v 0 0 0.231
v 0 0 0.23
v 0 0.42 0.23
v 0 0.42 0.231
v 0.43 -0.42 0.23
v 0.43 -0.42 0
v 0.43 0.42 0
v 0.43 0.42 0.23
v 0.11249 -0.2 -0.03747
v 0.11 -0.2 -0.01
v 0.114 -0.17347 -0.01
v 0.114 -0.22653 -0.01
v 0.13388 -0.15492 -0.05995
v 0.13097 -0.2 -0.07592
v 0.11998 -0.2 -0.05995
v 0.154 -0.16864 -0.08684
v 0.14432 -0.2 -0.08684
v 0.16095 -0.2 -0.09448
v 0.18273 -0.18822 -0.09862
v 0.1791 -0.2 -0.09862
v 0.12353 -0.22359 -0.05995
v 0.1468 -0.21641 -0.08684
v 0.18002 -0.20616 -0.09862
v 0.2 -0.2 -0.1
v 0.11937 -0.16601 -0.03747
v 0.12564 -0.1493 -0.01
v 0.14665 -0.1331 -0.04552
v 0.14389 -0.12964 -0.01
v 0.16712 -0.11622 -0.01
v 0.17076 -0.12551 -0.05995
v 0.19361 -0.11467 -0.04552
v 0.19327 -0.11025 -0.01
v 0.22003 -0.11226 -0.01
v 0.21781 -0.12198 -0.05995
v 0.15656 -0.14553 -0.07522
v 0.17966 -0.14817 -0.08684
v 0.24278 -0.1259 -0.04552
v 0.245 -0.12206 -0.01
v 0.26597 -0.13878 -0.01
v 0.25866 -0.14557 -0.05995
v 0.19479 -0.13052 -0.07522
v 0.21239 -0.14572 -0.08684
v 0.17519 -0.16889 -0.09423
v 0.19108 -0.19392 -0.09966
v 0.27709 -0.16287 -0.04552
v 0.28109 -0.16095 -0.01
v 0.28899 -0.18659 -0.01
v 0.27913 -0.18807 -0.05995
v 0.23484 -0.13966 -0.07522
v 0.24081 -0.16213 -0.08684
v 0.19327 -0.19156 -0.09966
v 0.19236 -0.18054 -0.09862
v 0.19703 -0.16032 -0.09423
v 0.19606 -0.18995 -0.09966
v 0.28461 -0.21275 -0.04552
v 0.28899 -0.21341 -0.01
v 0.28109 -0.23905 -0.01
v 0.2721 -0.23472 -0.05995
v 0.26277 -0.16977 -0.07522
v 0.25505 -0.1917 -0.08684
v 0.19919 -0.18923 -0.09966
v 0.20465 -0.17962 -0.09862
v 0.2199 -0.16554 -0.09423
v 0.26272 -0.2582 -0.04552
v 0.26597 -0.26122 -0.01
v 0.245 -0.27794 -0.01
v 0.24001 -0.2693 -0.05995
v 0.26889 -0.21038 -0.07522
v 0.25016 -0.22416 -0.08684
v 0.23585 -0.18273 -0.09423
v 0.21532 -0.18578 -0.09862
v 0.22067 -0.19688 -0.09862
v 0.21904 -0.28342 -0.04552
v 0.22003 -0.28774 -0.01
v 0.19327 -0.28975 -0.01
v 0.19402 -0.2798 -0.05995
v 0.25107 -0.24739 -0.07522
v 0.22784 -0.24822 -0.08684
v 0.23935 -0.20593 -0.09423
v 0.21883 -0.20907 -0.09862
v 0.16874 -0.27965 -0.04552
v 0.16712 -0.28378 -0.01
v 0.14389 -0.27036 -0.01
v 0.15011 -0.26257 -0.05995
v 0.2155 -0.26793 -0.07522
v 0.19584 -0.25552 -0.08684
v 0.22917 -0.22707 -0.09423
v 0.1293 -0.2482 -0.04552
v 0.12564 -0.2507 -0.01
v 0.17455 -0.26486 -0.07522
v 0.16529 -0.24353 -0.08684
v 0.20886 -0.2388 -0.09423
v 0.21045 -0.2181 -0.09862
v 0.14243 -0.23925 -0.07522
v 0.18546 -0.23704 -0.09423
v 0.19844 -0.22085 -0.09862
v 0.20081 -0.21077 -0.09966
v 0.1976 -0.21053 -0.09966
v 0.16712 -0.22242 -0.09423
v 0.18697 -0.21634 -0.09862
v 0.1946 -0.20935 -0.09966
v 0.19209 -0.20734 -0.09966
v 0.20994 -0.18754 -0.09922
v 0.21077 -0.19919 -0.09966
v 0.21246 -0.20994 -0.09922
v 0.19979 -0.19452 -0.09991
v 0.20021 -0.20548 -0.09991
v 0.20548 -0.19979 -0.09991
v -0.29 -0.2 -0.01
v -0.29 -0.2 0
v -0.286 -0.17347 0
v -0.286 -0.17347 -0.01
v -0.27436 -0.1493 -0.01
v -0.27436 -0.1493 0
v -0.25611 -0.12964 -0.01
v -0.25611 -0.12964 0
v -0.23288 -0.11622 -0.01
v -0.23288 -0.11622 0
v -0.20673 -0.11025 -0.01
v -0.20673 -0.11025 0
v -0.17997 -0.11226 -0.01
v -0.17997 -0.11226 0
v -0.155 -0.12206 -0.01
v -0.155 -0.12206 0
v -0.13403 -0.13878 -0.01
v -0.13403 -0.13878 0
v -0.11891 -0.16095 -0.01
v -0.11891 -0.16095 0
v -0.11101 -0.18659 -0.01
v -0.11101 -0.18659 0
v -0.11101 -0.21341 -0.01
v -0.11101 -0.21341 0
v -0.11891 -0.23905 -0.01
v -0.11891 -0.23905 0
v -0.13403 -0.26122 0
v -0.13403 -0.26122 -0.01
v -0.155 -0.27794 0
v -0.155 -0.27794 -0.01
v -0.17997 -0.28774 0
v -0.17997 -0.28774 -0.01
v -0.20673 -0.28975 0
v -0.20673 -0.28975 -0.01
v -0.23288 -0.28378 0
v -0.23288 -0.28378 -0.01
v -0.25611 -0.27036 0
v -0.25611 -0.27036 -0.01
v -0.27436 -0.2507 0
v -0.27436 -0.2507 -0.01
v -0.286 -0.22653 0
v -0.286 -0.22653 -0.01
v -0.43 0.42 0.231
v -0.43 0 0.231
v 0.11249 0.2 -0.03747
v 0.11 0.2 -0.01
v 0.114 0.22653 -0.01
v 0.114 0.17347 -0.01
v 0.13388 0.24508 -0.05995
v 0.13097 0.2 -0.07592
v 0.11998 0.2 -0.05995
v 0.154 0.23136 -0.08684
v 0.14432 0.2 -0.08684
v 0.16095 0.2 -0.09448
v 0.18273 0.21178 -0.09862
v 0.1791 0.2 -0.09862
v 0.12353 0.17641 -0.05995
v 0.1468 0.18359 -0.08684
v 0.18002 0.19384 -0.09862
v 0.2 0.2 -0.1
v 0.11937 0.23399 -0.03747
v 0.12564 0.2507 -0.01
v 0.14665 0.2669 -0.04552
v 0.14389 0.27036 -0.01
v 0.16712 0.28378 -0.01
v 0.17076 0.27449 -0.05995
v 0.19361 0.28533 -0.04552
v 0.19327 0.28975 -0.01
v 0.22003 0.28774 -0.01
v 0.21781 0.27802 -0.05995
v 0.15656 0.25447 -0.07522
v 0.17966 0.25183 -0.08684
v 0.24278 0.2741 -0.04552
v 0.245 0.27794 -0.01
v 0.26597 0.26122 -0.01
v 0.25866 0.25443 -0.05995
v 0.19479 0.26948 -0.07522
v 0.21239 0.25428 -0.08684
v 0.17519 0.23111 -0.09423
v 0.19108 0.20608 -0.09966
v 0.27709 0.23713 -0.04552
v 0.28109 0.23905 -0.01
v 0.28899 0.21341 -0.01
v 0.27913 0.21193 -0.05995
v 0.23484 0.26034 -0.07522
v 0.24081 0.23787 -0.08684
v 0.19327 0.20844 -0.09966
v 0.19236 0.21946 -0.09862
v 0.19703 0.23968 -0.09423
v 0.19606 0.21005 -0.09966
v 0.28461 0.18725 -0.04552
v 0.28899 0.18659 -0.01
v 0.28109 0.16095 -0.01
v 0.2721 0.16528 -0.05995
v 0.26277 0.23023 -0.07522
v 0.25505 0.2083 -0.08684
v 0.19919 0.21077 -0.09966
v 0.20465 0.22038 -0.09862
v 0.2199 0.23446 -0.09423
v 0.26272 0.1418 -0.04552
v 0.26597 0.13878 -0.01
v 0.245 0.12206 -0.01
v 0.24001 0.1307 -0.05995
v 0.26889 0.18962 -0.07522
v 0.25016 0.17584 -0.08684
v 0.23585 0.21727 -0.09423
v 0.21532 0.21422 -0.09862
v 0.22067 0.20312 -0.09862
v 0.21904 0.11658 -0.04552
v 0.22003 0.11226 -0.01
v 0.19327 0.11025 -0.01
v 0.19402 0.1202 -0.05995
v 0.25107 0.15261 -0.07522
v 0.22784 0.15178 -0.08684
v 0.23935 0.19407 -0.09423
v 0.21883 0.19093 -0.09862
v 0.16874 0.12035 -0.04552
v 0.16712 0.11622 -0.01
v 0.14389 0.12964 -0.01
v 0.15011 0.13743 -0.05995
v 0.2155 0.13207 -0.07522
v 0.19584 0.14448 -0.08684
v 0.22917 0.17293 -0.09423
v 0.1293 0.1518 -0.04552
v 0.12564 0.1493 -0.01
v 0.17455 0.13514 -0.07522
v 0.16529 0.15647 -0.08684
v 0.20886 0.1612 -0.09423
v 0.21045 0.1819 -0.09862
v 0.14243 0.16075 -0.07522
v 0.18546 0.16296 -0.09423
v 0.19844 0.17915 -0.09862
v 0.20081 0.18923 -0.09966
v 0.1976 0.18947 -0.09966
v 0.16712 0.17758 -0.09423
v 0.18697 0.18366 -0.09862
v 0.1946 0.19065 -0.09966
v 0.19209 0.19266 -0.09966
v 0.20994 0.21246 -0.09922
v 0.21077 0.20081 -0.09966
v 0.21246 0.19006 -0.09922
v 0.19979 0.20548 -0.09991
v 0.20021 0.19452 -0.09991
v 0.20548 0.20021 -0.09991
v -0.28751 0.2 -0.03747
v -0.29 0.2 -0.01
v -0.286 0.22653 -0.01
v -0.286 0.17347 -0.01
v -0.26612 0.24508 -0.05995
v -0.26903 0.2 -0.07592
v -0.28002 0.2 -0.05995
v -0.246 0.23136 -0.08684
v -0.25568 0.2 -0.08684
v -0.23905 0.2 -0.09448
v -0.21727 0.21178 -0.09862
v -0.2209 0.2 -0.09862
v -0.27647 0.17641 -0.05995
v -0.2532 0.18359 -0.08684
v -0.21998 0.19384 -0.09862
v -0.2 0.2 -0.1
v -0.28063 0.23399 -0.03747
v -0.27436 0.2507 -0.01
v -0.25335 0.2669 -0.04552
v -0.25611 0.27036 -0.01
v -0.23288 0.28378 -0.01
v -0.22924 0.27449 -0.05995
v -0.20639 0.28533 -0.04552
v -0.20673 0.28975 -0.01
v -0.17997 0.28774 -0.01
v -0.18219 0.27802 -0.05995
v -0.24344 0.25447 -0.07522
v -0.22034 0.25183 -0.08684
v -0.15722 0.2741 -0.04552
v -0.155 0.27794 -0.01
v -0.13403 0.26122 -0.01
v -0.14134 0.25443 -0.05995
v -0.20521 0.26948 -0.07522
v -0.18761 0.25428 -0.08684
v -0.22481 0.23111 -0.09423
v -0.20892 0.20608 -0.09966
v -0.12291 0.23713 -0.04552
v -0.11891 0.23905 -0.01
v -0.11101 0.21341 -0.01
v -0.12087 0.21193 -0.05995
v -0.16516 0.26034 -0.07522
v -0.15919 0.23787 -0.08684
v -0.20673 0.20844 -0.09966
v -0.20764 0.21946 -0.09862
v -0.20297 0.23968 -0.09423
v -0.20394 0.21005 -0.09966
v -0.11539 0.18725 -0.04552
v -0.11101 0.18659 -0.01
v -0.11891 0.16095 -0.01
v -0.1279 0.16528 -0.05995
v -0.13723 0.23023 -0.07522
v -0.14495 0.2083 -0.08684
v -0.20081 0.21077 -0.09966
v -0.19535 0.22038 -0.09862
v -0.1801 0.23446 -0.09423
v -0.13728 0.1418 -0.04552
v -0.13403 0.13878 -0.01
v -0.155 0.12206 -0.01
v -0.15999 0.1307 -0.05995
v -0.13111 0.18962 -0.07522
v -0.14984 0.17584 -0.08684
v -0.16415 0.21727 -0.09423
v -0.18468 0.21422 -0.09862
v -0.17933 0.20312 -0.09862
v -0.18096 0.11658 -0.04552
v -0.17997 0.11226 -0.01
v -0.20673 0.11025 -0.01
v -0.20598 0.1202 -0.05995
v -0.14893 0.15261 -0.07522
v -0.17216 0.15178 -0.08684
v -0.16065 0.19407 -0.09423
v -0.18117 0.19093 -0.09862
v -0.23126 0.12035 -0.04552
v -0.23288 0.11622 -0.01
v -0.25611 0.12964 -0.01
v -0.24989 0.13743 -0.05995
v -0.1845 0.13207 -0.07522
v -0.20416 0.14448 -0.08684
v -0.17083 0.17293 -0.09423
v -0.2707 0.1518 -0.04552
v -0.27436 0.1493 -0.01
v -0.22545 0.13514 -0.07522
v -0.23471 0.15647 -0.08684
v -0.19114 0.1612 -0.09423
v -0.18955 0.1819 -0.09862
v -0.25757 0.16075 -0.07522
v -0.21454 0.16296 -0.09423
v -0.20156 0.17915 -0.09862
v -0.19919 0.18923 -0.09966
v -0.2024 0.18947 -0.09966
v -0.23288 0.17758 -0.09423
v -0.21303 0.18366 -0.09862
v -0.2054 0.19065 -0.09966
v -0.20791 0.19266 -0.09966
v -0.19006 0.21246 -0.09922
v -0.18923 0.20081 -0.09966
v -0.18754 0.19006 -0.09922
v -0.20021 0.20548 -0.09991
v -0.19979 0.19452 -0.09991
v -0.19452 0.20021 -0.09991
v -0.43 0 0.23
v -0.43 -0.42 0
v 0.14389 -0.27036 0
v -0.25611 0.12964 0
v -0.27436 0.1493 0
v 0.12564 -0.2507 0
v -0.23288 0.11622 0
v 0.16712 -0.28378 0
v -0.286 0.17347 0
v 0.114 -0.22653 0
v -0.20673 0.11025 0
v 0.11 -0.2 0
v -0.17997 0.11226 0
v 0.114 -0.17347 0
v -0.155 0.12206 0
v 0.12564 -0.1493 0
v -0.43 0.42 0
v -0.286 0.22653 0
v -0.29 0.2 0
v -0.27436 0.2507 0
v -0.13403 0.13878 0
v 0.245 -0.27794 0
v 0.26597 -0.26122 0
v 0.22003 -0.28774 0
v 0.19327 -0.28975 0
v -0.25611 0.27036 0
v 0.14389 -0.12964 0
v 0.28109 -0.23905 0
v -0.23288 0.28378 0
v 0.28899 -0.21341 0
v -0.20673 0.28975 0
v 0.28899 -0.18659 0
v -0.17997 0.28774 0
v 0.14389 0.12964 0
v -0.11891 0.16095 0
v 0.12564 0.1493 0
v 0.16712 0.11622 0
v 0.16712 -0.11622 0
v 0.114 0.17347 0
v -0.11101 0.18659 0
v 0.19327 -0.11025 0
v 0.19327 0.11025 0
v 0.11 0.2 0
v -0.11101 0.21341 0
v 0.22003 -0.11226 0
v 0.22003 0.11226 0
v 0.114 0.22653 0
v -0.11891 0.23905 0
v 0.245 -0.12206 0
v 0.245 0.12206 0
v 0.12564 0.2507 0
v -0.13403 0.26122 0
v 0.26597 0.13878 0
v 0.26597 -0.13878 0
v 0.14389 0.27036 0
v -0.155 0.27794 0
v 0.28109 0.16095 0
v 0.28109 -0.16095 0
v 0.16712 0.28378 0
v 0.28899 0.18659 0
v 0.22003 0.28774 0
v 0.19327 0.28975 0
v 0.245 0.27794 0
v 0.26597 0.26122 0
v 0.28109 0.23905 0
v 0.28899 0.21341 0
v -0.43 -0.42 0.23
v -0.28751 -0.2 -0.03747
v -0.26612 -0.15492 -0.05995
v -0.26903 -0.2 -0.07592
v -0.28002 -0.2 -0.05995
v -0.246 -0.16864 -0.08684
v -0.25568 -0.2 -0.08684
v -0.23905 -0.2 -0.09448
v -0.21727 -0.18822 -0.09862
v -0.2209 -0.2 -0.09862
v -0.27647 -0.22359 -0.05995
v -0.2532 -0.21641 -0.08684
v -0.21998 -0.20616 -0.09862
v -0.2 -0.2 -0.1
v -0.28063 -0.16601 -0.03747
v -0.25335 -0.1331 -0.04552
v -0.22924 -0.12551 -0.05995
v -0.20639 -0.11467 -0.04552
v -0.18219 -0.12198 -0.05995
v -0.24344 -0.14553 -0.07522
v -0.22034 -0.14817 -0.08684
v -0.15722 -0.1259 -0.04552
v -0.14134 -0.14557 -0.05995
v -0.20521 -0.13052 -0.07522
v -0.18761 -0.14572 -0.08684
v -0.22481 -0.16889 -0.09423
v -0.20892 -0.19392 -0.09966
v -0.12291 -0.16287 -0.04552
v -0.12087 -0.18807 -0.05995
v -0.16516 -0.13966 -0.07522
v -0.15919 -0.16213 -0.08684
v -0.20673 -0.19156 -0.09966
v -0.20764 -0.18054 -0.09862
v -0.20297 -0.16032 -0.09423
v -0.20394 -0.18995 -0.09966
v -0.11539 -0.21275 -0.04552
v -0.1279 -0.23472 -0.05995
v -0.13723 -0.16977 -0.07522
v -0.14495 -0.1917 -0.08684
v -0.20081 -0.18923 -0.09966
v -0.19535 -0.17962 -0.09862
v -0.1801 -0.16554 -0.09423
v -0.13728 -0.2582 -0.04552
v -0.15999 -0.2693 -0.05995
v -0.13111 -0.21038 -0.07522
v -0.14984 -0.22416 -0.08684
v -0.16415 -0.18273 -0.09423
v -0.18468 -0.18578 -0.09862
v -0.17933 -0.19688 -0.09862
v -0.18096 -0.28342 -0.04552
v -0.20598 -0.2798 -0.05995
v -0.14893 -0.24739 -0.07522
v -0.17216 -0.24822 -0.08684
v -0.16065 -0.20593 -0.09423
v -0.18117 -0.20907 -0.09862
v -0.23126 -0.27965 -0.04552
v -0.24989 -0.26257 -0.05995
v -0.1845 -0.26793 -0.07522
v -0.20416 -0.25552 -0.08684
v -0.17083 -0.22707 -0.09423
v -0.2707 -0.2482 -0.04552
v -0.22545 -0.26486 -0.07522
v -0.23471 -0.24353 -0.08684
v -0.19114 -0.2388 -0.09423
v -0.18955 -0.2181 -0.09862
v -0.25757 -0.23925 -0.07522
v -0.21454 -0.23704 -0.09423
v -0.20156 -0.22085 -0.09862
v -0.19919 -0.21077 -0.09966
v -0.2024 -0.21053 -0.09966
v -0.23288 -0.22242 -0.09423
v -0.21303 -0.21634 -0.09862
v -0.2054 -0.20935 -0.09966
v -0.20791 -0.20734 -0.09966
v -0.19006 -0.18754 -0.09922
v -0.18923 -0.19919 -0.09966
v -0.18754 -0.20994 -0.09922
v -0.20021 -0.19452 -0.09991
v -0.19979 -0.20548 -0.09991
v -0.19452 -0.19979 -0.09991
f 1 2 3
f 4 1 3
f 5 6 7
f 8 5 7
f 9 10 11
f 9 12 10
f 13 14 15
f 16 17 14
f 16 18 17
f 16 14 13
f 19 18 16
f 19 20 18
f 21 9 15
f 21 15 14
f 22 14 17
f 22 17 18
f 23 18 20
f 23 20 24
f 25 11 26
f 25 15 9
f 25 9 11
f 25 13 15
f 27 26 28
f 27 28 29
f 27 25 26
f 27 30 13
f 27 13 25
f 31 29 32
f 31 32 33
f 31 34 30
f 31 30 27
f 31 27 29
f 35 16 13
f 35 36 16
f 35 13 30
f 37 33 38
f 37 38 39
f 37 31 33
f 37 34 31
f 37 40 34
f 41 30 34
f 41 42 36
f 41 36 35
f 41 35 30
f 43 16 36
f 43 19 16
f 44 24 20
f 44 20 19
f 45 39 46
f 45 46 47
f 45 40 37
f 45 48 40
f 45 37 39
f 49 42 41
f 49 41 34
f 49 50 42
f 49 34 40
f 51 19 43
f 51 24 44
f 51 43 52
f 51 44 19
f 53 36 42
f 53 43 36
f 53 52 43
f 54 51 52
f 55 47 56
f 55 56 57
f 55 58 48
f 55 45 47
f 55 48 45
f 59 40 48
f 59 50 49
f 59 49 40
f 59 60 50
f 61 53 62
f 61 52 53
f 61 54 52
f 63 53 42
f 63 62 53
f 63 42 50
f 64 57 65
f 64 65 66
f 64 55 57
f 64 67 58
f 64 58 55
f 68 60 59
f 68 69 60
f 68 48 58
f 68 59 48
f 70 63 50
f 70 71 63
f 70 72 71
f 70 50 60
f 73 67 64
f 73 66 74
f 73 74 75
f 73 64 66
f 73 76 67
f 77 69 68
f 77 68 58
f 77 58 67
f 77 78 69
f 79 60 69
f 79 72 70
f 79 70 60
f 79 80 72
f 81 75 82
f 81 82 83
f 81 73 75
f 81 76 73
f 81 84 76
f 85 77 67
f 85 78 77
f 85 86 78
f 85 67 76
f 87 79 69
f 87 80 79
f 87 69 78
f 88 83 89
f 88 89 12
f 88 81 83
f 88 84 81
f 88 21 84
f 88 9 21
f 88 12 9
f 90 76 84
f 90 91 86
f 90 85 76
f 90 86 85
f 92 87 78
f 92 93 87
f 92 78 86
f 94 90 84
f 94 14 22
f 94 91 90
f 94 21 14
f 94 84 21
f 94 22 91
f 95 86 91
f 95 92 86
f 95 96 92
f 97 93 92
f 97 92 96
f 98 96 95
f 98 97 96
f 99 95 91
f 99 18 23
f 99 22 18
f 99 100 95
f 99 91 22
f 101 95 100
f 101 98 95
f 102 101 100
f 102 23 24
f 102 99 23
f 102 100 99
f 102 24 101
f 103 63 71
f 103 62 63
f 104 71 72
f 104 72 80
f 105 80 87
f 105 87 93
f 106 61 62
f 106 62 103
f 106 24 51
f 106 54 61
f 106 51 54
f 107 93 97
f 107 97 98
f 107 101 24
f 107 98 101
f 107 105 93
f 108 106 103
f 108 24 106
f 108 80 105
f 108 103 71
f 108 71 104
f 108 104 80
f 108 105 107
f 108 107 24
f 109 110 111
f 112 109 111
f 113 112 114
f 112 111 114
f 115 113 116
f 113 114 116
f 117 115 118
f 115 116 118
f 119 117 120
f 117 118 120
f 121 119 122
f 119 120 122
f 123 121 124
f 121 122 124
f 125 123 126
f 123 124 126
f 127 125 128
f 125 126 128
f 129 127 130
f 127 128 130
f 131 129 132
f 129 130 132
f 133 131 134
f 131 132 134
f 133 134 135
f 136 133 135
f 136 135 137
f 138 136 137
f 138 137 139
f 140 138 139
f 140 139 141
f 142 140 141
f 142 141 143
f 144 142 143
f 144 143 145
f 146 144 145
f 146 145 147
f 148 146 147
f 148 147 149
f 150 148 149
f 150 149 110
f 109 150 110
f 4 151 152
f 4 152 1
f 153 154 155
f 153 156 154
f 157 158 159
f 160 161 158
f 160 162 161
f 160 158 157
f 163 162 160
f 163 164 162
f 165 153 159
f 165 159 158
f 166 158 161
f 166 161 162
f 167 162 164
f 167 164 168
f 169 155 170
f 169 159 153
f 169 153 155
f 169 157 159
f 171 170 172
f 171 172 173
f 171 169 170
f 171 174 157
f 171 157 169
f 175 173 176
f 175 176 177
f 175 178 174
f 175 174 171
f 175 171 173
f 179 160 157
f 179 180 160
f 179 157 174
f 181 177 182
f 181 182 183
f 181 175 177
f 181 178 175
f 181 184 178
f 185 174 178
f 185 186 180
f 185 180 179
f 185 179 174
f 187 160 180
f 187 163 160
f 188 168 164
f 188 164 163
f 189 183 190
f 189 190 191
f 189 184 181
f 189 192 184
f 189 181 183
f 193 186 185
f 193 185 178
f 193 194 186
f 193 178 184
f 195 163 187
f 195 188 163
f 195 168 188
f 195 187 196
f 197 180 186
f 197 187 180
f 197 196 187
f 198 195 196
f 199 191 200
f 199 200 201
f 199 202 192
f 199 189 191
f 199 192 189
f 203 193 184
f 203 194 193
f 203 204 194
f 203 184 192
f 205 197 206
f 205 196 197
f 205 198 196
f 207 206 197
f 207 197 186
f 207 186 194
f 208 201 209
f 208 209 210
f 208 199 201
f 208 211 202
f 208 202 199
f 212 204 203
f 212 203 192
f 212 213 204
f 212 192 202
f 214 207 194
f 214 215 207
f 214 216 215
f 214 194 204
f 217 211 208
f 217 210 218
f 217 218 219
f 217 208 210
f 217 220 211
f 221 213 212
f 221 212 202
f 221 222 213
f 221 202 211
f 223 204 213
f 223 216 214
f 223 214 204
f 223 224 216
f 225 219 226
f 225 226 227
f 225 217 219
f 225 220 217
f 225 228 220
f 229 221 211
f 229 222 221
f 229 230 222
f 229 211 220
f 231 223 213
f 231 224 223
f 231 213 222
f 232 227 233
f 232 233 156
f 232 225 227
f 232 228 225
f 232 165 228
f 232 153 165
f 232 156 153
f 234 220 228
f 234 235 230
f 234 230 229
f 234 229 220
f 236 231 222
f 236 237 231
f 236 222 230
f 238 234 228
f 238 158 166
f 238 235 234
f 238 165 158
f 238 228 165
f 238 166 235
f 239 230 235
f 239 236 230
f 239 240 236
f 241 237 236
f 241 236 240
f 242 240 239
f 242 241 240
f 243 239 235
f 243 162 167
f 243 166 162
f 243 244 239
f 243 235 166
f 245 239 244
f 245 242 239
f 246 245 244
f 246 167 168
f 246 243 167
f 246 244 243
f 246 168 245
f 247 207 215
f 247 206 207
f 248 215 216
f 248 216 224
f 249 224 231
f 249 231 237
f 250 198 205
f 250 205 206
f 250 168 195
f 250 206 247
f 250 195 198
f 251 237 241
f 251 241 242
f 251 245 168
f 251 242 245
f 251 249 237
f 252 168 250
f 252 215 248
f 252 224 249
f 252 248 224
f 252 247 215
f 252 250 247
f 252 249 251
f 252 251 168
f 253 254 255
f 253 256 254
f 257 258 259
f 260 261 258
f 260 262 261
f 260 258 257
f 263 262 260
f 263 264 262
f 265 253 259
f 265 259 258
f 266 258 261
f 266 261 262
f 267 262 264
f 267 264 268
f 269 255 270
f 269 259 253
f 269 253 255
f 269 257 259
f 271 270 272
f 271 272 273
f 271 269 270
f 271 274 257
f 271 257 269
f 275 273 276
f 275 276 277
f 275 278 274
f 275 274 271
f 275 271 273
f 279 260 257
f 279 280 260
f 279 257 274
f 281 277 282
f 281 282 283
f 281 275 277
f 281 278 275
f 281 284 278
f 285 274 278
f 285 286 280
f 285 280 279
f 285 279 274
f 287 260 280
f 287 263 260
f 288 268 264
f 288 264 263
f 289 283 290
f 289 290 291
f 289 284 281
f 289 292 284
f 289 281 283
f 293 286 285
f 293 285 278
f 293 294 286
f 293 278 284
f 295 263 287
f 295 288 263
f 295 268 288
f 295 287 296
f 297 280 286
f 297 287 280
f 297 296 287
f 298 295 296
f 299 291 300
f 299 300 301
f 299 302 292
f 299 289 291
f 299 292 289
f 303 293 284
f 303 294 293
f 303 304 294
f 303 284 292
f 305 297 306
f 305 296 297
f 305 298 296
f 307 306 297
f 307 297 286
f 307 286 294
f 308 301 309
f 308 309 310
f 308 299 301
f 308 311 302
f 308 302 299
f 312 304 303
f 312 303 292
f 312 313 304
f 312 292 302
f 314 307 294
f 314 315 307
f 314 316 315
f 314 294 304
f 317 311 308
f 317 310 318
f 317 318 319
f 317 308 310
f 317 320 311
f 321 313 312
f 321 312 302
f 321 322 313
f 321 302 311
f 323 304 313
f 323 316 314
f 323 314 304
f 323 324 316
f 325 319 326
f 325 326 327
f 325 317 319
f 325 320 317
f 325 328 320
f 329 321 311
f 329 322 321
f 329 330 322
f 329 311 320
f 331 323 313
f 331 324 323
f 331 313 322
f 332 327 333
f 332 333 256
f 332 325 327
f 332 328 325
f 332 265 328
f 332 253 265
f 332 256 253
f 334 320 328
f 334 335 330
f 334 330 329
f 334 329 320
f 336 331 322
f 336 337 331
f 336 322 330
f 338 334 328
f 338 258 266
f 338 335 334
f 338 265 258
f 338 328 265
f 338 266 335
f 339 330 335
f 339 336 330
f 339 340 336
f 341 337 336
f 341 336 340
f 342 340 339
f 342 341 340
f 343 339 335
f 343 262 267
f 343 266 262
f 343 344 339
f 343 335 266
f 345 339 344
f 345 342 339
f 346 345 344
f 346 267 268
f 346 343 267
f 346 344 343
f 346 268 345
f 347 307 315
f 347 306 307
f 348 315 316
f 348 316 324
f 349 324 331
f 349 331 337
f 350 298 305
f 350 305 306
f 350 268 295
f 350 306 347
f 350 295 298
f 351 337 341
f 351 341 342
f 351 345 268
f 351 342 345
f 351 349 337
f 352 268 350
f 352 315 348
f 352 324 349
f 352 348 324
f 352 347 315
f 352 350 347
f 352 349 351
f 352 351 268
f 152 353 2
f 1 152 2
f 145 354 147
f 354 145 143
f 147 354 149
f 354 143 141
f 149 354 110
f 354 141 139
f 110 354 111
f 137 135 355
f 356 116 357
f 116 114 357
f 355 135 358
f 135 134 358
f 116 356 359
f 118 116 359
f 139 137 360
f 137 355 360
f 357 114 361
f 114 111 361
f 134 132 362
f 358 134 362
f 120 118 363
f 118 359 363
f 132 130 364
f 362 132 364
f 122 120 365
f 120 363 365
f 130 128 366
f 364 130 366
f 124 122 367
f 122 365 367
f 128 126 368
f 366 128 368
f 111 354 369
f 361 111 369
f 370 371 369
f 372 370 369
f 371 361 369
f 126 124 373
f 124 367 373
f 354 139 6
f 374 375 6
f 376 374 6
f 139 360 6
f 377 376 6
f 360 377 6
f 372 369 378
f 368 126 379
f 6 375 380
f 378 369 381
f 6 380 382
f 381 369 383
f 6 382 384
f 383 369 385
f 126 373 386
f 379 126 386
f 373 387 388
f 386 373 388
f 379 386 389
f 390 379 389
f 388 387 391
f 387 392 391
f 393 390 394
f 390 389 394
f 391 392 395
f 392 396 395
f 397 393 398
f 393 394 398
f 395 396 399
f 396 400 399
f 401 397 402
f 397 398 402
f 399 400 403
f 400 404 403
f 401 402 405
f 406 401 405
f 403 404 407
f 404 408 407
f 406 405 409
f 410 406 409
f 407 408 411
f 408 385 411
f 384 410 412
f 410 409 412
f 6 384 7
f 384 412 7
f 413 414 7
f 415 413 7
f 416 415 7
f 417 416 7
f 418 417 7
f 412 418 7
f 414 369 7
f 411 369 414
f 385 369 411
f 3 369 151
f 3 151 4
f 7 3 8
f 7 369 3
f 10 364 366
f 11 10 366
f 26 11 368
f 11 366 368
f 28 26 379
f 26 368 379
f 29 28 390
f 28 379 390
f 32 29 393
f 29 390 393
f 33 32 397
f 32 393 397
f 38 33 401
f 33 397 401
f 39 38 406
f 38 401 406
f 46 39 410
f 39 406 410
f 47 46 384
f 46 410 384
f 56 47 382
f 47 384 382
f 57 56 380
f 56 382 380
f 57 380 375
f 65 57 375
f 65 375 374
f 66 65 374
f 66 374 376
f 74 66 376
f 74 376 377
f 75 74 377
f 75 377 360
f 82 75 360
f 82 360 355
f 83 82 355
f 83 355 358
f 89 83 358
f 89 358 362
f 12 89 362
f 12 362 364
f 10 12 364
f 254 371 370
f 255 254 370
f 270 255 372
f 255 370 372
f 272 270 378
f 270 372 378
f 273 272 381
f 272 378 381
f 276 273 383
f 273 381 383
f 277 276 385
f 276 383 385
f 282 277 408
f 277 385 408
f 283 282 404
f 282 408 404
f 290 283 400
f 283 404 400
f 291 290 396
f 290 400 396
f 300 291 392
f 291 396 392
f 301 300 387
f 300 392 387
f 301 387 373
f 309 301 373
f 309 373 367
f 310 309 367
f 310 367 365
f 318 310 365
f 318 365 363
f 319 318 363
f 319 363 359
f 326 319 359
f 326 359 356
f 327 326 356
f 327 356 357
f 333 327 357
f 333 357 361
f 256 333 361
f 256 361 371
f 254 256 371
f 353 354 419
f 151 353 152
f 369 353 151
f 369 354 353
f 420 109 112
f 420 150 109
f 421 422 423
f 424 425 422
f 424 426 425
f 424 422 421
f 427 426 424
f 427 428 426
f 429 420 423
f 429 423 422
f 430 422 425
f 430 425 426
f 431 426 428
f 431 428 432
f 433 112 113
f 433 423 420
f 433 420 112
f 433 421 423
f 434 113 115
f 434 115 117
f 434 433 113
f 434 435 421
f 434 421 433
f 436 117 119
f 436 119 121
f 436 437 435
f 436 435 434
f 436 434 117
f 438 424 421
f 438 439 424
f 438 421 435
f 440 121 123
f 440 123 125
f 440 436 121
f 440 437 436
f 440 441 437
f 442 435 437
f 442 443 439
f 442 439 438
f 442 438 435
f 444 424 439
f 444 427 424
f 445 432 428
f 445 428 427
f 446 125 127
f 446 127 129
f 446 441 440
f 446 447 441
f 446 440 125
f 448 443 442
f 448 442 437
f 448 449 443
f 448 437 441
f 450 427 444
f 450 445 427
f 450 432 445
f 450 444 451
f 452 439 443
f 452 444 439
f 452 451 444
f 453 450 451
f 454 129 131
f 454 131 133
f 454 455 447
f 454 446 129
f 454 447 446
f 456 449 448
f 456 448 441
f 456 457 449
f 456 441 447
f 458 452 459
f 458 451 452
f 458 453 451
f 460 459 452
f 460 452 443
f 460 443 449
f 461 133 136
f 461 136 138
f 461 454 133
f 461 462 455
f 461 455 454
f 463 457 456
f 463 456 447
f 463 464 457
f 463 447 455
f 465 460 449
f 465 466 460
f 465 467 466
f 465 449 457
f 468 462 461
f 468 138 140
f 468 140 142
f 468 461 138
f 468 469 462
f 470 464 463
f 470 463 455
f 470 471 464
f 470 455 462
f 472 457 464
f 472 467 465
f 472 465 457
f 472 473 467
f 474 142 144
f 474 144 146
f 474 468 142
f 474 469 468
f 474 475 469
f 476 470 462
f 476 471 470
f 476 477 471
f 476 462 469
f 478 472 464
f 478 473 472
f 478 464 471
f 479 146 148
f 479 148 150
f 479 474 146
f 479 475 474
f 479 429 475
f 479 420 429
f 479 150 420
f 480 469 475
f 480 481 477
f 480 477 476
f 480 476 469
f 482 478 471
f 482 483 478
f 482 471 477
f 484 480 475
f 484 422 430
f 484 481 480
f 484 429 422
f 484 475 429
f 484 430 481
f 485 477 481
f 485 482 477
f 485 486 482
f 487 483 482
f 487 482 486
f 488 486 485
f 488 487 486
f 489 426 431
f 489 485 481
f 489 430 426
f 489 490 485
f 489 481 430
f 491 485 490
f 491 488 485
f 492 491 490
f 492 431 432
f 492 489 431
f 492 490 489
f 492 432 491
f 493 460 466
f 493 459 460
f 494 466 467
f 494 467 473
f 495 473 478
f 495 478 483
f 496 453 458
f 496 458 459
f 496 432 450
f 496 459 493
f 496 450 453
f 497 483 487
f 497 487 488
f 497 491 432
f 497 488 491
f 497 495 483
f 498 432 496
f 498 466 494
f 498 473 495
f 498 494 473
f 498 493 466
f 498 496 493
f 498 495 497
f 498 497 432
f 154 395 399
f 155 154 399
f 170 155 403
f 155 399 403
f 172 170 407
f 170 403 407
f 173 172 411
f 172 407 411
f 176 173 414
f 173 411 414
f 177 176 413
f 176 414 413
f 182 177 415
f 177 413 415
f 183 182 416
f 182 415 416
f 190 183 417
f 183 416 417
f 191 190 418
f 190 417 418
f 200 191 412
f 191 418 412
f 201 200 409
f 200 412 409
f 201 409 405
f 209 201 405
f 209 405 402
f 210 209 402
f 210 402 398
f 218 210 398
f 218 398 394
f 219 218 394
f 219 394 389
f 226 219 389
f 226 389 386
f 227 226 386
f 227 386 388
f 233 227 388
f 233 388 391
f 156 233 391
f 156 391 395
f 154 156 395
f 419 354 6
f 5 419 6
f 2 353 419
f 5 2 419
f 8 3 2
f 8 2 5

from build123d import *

# Parameters (mm, degrees)
SKETCH1_W                 = 0.86
SKETCH1_H                 = 0.84
BOSS_EXTRUDE1_DEPTH       = 0.23
SKETCH2_W                 = 0.43
SKETCH2_H                 = 0.42
BOSS_EXTRUDE2_DEPTH       = 0.001
SKETCH3_R                 = 0.09
BOSS_EXTRUDE3_DEPTH       = 0.1
FILLET1_SIZE              = 0.09
LPATTERN2_COUNT           = 2
LPATTERN2_PITCH           = 0.4
LPATTERN2_COUNT_DIR2      = 2
LPATTERN2_PITCH_DIR2      = 0.4
FILLET1_OF_LPATTERN2_SIZE = 0.09


with BuildPart() as part:
    # Sketch1 → Boss-Extrude1 (new body)
    with BuildSketch(Plane.XY):
        Rectangle(SKETCH1_W, SKETCH1_H)
    extrude(amount=BOSS_EXTRUDE1_DEPTH)

    # Sketch2 → Boss-Extrude2 (add)
    with BuildSketch(Plane.XY.offset(0.23)):
        with Locations((-0.215, 0.21)):
            Rectangle(SKETCH2_W, SKETCH2_H)
    extrude(amount=BOSS_EXTRUDE2_DEPTH)

    # Sketch3 → Boss-Extrude3 (add)
    with BuildSketch(Plane(origin=(0, 0, 0), x_dir=(-1, 0, 0), z_dir=(0, 0, -1))):
        with Locations((-0.2, 0.2)):
            Circle(SKETCH3_R)
    boss_extrude3 = extrude(amount=BOSS_EXTRUDE3_DEPTH)

    # Fillet1
    # a fillet whose section is not a circle: 0.09 mm, written as the material it takes off along each edge
    with BuildSketch(Plane(origin=(0.2, 0.2, -0.1), x_dir=(-1, 0, 0), z_dir=(0, -1, 0))) as fillet1_piece_1:
        with BuildLine():
            Bezier((0.09, -FILLET1_SIZE), (0.09, 0), (0.09 - FILLET1_SIZE, 0), weights=[1, 1, 1])
            Line((0.09 - FILLET1_SIZE, 0), (0.09, 0))
            Line((0.09, 0), (0.09, -FILLET1_SIZE))
        make_face()
    revolve(axis=Axis((0.2, 0.2, -0.1), (0, 0, -1)), mode=Mode.SUBTRACT)

    # LPattern2: Boss-Extrude3 2 × 2
    with Locations(*[(-i * LPATTERN2_PITCH, -j * LPATTERN2_PITCH_DIR2, 0) for i in range(LPATTERN2_COUNT) for j in range(LPATTERN2_COUNT_DIR2) if (i, j) != (0, 0)]):
        add(boss_extrude3)

    # Fillet1 of LPattern2
    # a fillet whose section is not a circle: 0.09 mm, written as the material it takes off along each edge
    with BuildSketch(Plane(origin=(0.2, -0.2, -0.1), x_dir=(-1, 0, 0), z_dir=(0, -1, 0))) as fillet1_of_lpattern2_piece_1:
        with BuildLine():
            Bezier((0.09, -FILLET1_OF_LPATTERN2_SIZE), (0.09, 0), (0.09 - FILLET1_OF_LPATTERN2_SIZE, 0), weights=[1, 1, 1])
            Line((0.09 - FILLET1_OF_LPATTERN2_SIZE, 0), (0.09, 0))
            Line((0.09, 0), (0.09, -FILLET1_OF_LPATTERN2_SIZE))
        make_face()
    revolve(axis=Axis((0.2, -0.2, -0.1), (0, 0, -1)), mode=Mode.SUBTRACT)
    with BuildSketch(Plane(origin=(-0.2, 0.2, -0.1), x_dir=(-1, 0, 0), z_dir=(0, -1, 0))) as fillet1_of_lpattern2_piece_2:
        with BuildLine():
            Bezier((0.09, -FILLET1_OF_LPATTERN2_SIZE), (0.09, 0), (0.09 - FILLET1_OF_LPATTERN2_SIZE, 0), weights=[1, 1, 1])
            Line((0.09 - FILLET1_OF_LPATTERN2_SIZE, 0), (0.09, 0))
            Line((0.09, 0), (0.09, -FILLET1_OF_LPATTERN2_SIZE))
        make_face()
    revolve(axis=Axis((-0.2, 0.2, -0.1), (0, 0, -1)), mode=Mode.SUBTRACT)
    with BuildSketch(Plane(origin=(-0.2, -0.2, -0.1), x_dir=(-1, 0, 0), z_dir=(0, -1, 0))) as fillet1_of_lpattern2_piece_3:
        with BuildLine():
            Bezier((0.09, -FILLET1_OF_LPATTERN2_SIZE), (0.09, 0), (0.09 - FILLET1_OF_LPATTERN2_SIZE, 0), weights=[1, 1, 1])
            Line((0.09 - FILLET1_OF_LPATTERN2_SIZE, 0), (0.09, 0))
            Line((0.09, 0), (0.09, -FILLET1_OF_LPATTERN2_SIZE))
        make_face()
    revolve(axis=Axis((-0.2, -0.2, -0.1), (0, 0, -1)), mode=Mode.SUBTRACT)


solid = part.part
